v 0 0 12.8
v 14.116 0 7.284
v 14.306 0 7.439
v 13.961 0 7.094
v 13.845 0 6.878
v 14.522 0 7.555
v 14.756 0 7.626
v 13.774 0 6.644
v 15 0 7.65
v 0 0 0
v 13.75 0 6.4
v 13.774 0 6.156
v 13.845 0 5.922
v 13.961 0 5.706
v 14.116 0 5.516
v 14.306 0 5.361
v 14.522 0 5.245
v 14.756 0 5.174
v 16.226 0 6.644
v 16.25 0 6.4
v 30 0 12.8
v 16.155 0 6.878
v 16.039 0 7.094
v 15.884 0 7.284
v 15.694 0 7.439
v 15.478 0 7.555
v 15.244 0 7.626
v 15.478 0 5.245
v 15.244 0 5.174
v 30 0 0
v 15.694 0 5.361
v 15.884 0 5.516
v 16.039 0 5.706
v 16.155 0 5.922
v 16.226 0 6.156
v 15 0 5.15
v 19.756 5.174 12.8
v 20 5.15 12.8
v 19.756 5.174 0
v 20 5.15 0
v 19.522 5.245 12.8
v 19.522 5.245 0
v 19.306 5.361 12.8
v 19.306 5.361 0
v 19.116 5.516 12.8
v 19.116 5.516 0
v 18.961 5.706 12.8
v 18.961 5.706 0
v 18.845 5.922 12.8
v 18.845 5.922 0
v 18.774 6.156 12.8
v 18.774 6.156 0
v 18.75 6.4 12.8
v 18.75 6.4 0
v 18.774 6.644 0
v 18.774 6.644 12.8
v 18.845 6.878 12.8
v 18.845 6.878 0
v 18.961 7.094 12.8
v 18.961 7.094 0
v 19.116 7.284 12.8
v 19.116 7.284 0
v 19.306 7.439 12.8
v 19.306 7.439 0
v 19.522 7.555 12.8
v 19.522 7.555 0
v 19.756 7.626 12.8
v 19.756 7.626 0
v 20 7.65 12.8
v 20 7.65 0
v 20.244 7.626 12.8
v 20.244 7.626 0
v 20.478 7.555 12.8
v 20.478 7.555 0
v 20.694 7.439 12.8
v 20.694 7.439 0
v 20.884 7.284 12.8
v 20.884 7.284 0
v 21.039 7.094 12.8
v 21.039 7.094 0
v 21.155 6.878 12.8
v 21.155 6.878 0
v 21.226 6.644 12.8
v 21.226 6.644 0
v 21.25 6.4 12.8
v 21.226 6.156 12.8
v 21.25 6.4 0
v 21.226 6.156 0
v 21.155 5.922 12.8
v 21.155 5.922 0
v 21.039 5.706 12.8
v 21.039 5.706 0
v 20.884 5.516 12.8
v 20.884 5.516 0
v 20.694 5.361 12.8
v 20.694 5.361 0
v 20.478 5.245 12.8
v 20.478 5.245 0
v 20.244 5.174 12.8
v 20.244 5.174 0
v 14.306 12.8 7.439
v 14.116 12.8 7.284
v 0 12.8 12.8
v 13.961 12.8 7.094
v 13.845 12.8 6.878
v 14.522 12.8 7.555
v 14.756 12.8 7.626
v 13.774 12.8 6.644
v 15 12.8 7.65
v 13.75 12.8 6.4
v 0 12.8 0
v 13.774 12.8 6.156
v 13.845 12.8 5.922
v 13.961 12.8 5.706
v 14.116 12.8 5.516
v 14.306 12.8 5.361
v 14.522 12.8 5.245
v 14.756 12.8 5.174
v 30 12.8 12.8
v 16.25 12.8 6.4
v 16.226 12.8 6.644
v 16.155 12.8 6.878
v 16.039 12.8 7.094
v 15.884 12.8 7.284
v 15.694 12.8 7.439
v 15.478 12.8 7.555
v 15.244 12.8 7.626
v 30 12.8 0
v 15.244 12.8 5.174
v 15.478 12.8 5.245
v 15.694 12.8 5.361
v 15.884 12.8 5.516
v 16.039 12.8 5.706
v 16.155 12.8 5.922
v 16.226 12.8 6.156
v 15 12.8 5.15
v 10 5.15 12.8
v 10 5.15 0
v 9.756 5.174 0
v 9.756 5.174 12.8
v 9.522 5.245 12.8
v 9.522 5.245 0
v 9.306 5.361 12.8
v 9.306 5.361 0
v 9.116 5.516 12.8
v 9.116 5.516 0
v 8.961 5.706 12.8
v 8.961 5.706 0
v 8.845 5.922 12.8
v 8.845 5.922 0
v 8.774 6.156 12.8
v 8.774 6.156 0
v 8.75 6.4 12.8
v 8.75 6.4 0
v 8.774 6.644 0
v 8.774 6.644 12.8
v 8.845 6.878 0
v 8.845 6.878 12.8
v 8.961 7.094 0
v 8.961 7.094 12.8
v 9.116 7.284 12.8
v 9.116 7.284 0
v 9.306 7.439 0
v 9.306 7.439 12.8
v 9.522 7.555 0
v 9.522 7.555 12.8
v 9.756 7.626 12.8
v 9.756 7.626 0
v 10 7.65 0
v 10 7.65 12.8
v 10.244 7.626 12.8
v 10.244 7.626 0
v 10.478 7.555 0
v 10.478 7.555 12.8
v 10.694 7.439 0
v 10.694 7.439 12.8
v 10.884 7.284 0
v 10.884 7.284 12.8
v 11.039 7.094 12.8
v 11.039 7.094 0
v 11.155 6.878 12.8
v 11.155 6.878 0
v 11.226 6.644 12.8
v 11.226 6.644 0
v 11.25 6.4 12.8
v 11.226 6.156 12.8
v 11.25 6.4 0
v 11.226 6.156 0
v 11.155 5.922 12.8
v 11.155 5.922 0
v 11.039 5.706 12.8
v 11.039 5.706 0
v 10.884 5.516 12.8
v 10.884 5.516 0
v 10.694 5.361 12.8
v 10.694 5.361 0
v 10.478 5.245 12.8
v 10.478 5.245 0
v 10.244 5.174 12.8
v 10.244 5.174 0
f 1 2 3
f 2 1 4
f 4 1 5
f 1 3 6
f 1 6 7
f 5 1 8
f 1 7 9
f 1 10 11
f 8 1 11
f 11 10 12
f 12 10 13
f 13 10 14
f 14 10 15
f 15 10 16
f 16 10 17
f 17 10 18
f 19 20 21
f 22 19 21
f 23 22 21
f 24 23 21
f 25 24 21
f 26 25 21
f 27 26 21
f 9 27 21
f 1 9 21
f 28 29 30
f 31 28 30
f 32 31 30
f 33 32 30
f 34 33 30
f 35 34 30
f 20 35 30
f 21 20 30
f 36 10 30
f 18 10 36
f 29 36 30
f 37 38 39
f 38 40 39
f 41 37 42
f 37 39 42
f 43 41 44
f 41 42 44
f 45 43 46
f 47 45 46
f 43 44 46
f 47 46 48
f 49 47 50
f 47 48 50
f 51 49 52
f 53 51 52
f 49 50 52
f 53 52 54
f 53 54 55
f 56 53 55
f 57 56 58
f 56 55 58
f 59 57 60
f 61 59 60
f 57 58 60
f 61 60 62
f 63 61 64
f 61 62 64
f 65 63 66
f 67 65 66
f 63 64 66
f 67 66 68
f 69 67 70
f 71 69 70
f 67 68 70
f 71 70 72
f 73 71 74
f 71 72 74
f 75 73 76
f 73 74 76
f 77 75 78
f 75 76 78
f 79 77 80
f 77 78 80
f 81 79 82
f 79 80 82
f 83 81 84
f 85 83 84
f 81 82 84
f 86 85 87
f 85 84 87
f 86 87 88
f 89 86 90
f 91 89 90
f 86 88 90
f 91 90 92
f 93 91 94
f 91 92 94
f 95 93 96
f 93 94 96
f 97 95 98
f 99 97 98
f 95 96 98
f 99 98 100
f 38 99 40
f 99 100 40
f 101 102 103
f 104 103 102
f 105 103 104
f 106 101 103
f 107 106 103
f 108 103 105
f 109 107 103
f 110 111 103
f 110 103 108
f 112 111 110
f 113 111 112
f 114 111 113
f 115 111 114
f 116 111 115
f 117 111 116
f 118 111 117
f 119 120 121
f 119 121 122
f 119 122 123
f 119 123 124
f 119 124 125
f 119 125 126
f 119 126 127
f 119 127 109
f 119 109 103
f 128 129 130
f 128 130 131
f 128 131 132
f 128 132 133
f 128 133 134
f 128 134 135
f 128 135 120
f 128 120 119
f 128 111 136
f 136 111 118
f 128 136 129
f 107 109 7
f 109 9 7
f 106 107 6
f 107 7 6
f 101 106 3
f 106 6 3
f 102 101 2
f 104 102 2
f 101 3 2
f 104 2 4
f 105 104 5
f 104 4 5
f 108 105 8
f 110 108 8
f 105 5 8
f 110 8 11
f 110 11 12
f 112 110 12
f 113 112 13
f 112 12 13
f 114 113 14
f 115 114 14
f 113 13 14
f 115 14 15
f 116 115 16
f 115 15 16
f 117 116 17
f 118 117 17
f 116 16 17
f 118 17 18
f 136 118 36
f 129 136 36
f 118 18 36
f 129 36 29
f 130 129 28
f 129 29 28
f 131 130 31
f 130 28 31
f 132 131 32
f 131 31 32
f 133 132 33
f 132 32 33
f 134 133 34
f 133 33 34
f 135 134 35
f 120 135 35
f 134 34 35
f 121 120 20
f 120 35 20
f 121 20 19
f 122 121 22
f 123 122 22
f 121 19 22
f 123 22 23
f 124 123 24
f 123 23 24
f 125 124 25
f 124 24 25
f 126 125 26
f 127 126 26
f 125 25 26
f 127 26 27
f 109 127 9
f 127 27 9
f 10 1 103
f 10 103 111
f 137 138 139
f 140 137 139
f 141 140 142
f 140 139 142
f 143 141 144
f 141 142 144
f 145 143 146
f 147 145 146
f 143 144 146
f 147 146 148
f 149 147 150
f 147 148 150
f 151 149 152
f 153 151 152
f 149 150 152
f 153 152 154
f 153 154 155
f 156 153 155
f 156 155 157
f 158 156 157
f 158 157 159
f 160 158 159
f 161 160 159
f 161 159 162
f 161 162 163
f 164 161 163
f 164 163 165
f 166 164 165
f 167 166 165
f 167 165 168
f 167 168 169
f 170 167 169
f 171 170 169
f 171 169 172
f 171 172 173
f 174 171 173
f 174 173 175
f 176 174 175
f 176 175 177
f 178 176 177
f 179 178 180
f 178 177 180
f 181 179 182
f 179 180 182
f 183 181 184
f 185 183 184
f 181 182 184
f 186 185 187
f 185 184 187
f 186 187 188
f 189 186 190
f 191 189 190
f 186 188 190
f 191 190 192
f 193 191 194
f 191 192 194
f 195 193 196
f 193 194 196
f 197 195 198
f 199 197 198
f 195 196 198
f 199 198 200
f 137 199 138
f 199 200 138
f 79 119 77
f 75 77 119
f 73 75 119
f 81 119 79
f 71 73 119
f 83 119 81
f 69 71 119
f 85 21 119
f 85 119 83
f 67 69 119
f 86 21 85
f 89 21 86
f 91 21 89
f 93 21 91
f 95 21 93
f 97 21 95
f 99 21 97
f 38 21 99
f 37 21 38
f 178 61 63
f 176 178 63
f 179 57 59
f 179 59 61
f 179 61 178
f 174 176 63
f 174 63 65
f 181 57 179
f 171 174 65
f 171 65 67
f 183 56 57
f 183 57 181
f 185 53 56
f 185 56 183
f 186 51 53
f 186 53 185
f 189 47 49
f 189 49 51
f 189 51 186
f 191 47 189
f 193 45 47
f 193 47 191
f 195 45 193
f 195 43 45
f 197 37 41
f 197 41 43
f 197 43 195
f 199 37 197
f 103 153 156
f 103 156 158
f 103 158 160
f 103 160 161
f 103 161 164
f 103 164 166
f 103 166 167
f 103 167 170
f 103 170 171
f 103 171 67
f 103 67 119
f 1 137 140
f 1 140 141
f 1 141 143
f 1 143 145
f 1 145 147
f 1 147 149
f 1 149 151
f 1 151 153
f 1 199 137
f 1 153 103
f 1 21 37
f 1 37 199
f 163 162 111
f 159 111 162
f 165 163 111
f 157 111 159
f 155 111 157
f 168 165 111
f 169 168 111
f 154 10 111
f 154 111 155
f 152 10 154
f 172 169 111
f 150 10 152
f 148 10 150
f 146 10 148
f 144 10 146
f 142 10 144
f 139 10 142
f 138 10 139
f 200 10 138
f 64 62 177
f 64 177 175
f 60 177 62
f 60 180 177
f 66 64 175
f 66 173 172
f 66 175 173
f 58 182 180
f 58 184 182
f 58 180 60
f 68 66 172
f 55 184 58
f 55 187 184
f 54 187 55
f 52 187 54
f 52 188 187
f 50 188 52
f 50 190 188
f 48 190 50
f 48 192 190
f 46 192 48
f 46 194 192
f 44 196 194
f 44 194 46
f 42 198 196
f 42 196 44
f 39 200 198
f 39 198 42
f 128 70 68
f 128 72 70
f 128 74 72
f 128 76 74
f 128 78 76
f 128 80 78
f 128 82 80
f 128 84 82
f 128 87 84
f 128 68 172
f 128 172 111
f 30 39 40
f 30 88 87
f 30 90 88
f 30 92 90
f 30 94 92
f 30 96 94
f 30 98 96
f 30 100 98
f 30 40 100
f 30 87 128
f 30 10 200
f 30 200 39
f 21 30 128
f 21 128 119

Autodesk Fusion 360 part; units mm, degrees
sketch "Sketch1" plane through (0, 0, 0) normal (0, 1, 0) x (1, 0, 0)
  line L0 (0, 0) -> (30, 0)
  line L1 (30, 0) -> (30, -12.8)
  line L2 (30, -12.8) -> (0, -12.8)
  line L3 (0, -12.8) -> (0, 0)
  dimension "d1" = 30
  dimension "d2" = 12.8
extrude "Extrude1" add sketch "Sketch1" along normal blind 12.8
sketch "Sketch2" plane through (0, 12.8, 0) normal (0, 1, 0) x (-1, 0, 0)
  line L0 (0, 12.8) -> (-30, 12.8)
  line L1 (-30, 12.8) -> (-30, 0)
  line L2 (-30, 0) -> (0, 0)
  line L3 (0, 0) -> (0, 12.8)
  line L4 (-15, 0) -> (-15, 12.8) construction
  line L5 (0, 6.4) -> (-30, 6.4) construction
  point P0 (-15, 6.4)
hole "Hole1" at (15, 12.8, 6.4) direction (0, -1, 0) diameter 2.5 end through all
sketch "Sketch3" plane through (0, 0, 12.8) normal (0, 0, 1) x (1, 0, 0)
  line L0 (0, 0) -> (30, 0)
  line L1 (30, 0) -> (30, 12.8)
  line L2 (30, 12.8) -> (0, 12.8)
  line L3 (0, 12.8) -> (0, 0)
  line L4 (0, 6.4) -> (30, 6.4) construction
  point P0 (5, 6.4)
  point P1 (15, 6.4)
  dimension "d8" = 10
  dimension "d9" = 5
hole "Hole2" at (10, 6.4, 12.8) direction (0, 0, -1) diameter 2.5 end through all
hole "Hole3" at (20, 6.4, 12.8) direction (0, 0, -1) diameter 2.5 end through all
